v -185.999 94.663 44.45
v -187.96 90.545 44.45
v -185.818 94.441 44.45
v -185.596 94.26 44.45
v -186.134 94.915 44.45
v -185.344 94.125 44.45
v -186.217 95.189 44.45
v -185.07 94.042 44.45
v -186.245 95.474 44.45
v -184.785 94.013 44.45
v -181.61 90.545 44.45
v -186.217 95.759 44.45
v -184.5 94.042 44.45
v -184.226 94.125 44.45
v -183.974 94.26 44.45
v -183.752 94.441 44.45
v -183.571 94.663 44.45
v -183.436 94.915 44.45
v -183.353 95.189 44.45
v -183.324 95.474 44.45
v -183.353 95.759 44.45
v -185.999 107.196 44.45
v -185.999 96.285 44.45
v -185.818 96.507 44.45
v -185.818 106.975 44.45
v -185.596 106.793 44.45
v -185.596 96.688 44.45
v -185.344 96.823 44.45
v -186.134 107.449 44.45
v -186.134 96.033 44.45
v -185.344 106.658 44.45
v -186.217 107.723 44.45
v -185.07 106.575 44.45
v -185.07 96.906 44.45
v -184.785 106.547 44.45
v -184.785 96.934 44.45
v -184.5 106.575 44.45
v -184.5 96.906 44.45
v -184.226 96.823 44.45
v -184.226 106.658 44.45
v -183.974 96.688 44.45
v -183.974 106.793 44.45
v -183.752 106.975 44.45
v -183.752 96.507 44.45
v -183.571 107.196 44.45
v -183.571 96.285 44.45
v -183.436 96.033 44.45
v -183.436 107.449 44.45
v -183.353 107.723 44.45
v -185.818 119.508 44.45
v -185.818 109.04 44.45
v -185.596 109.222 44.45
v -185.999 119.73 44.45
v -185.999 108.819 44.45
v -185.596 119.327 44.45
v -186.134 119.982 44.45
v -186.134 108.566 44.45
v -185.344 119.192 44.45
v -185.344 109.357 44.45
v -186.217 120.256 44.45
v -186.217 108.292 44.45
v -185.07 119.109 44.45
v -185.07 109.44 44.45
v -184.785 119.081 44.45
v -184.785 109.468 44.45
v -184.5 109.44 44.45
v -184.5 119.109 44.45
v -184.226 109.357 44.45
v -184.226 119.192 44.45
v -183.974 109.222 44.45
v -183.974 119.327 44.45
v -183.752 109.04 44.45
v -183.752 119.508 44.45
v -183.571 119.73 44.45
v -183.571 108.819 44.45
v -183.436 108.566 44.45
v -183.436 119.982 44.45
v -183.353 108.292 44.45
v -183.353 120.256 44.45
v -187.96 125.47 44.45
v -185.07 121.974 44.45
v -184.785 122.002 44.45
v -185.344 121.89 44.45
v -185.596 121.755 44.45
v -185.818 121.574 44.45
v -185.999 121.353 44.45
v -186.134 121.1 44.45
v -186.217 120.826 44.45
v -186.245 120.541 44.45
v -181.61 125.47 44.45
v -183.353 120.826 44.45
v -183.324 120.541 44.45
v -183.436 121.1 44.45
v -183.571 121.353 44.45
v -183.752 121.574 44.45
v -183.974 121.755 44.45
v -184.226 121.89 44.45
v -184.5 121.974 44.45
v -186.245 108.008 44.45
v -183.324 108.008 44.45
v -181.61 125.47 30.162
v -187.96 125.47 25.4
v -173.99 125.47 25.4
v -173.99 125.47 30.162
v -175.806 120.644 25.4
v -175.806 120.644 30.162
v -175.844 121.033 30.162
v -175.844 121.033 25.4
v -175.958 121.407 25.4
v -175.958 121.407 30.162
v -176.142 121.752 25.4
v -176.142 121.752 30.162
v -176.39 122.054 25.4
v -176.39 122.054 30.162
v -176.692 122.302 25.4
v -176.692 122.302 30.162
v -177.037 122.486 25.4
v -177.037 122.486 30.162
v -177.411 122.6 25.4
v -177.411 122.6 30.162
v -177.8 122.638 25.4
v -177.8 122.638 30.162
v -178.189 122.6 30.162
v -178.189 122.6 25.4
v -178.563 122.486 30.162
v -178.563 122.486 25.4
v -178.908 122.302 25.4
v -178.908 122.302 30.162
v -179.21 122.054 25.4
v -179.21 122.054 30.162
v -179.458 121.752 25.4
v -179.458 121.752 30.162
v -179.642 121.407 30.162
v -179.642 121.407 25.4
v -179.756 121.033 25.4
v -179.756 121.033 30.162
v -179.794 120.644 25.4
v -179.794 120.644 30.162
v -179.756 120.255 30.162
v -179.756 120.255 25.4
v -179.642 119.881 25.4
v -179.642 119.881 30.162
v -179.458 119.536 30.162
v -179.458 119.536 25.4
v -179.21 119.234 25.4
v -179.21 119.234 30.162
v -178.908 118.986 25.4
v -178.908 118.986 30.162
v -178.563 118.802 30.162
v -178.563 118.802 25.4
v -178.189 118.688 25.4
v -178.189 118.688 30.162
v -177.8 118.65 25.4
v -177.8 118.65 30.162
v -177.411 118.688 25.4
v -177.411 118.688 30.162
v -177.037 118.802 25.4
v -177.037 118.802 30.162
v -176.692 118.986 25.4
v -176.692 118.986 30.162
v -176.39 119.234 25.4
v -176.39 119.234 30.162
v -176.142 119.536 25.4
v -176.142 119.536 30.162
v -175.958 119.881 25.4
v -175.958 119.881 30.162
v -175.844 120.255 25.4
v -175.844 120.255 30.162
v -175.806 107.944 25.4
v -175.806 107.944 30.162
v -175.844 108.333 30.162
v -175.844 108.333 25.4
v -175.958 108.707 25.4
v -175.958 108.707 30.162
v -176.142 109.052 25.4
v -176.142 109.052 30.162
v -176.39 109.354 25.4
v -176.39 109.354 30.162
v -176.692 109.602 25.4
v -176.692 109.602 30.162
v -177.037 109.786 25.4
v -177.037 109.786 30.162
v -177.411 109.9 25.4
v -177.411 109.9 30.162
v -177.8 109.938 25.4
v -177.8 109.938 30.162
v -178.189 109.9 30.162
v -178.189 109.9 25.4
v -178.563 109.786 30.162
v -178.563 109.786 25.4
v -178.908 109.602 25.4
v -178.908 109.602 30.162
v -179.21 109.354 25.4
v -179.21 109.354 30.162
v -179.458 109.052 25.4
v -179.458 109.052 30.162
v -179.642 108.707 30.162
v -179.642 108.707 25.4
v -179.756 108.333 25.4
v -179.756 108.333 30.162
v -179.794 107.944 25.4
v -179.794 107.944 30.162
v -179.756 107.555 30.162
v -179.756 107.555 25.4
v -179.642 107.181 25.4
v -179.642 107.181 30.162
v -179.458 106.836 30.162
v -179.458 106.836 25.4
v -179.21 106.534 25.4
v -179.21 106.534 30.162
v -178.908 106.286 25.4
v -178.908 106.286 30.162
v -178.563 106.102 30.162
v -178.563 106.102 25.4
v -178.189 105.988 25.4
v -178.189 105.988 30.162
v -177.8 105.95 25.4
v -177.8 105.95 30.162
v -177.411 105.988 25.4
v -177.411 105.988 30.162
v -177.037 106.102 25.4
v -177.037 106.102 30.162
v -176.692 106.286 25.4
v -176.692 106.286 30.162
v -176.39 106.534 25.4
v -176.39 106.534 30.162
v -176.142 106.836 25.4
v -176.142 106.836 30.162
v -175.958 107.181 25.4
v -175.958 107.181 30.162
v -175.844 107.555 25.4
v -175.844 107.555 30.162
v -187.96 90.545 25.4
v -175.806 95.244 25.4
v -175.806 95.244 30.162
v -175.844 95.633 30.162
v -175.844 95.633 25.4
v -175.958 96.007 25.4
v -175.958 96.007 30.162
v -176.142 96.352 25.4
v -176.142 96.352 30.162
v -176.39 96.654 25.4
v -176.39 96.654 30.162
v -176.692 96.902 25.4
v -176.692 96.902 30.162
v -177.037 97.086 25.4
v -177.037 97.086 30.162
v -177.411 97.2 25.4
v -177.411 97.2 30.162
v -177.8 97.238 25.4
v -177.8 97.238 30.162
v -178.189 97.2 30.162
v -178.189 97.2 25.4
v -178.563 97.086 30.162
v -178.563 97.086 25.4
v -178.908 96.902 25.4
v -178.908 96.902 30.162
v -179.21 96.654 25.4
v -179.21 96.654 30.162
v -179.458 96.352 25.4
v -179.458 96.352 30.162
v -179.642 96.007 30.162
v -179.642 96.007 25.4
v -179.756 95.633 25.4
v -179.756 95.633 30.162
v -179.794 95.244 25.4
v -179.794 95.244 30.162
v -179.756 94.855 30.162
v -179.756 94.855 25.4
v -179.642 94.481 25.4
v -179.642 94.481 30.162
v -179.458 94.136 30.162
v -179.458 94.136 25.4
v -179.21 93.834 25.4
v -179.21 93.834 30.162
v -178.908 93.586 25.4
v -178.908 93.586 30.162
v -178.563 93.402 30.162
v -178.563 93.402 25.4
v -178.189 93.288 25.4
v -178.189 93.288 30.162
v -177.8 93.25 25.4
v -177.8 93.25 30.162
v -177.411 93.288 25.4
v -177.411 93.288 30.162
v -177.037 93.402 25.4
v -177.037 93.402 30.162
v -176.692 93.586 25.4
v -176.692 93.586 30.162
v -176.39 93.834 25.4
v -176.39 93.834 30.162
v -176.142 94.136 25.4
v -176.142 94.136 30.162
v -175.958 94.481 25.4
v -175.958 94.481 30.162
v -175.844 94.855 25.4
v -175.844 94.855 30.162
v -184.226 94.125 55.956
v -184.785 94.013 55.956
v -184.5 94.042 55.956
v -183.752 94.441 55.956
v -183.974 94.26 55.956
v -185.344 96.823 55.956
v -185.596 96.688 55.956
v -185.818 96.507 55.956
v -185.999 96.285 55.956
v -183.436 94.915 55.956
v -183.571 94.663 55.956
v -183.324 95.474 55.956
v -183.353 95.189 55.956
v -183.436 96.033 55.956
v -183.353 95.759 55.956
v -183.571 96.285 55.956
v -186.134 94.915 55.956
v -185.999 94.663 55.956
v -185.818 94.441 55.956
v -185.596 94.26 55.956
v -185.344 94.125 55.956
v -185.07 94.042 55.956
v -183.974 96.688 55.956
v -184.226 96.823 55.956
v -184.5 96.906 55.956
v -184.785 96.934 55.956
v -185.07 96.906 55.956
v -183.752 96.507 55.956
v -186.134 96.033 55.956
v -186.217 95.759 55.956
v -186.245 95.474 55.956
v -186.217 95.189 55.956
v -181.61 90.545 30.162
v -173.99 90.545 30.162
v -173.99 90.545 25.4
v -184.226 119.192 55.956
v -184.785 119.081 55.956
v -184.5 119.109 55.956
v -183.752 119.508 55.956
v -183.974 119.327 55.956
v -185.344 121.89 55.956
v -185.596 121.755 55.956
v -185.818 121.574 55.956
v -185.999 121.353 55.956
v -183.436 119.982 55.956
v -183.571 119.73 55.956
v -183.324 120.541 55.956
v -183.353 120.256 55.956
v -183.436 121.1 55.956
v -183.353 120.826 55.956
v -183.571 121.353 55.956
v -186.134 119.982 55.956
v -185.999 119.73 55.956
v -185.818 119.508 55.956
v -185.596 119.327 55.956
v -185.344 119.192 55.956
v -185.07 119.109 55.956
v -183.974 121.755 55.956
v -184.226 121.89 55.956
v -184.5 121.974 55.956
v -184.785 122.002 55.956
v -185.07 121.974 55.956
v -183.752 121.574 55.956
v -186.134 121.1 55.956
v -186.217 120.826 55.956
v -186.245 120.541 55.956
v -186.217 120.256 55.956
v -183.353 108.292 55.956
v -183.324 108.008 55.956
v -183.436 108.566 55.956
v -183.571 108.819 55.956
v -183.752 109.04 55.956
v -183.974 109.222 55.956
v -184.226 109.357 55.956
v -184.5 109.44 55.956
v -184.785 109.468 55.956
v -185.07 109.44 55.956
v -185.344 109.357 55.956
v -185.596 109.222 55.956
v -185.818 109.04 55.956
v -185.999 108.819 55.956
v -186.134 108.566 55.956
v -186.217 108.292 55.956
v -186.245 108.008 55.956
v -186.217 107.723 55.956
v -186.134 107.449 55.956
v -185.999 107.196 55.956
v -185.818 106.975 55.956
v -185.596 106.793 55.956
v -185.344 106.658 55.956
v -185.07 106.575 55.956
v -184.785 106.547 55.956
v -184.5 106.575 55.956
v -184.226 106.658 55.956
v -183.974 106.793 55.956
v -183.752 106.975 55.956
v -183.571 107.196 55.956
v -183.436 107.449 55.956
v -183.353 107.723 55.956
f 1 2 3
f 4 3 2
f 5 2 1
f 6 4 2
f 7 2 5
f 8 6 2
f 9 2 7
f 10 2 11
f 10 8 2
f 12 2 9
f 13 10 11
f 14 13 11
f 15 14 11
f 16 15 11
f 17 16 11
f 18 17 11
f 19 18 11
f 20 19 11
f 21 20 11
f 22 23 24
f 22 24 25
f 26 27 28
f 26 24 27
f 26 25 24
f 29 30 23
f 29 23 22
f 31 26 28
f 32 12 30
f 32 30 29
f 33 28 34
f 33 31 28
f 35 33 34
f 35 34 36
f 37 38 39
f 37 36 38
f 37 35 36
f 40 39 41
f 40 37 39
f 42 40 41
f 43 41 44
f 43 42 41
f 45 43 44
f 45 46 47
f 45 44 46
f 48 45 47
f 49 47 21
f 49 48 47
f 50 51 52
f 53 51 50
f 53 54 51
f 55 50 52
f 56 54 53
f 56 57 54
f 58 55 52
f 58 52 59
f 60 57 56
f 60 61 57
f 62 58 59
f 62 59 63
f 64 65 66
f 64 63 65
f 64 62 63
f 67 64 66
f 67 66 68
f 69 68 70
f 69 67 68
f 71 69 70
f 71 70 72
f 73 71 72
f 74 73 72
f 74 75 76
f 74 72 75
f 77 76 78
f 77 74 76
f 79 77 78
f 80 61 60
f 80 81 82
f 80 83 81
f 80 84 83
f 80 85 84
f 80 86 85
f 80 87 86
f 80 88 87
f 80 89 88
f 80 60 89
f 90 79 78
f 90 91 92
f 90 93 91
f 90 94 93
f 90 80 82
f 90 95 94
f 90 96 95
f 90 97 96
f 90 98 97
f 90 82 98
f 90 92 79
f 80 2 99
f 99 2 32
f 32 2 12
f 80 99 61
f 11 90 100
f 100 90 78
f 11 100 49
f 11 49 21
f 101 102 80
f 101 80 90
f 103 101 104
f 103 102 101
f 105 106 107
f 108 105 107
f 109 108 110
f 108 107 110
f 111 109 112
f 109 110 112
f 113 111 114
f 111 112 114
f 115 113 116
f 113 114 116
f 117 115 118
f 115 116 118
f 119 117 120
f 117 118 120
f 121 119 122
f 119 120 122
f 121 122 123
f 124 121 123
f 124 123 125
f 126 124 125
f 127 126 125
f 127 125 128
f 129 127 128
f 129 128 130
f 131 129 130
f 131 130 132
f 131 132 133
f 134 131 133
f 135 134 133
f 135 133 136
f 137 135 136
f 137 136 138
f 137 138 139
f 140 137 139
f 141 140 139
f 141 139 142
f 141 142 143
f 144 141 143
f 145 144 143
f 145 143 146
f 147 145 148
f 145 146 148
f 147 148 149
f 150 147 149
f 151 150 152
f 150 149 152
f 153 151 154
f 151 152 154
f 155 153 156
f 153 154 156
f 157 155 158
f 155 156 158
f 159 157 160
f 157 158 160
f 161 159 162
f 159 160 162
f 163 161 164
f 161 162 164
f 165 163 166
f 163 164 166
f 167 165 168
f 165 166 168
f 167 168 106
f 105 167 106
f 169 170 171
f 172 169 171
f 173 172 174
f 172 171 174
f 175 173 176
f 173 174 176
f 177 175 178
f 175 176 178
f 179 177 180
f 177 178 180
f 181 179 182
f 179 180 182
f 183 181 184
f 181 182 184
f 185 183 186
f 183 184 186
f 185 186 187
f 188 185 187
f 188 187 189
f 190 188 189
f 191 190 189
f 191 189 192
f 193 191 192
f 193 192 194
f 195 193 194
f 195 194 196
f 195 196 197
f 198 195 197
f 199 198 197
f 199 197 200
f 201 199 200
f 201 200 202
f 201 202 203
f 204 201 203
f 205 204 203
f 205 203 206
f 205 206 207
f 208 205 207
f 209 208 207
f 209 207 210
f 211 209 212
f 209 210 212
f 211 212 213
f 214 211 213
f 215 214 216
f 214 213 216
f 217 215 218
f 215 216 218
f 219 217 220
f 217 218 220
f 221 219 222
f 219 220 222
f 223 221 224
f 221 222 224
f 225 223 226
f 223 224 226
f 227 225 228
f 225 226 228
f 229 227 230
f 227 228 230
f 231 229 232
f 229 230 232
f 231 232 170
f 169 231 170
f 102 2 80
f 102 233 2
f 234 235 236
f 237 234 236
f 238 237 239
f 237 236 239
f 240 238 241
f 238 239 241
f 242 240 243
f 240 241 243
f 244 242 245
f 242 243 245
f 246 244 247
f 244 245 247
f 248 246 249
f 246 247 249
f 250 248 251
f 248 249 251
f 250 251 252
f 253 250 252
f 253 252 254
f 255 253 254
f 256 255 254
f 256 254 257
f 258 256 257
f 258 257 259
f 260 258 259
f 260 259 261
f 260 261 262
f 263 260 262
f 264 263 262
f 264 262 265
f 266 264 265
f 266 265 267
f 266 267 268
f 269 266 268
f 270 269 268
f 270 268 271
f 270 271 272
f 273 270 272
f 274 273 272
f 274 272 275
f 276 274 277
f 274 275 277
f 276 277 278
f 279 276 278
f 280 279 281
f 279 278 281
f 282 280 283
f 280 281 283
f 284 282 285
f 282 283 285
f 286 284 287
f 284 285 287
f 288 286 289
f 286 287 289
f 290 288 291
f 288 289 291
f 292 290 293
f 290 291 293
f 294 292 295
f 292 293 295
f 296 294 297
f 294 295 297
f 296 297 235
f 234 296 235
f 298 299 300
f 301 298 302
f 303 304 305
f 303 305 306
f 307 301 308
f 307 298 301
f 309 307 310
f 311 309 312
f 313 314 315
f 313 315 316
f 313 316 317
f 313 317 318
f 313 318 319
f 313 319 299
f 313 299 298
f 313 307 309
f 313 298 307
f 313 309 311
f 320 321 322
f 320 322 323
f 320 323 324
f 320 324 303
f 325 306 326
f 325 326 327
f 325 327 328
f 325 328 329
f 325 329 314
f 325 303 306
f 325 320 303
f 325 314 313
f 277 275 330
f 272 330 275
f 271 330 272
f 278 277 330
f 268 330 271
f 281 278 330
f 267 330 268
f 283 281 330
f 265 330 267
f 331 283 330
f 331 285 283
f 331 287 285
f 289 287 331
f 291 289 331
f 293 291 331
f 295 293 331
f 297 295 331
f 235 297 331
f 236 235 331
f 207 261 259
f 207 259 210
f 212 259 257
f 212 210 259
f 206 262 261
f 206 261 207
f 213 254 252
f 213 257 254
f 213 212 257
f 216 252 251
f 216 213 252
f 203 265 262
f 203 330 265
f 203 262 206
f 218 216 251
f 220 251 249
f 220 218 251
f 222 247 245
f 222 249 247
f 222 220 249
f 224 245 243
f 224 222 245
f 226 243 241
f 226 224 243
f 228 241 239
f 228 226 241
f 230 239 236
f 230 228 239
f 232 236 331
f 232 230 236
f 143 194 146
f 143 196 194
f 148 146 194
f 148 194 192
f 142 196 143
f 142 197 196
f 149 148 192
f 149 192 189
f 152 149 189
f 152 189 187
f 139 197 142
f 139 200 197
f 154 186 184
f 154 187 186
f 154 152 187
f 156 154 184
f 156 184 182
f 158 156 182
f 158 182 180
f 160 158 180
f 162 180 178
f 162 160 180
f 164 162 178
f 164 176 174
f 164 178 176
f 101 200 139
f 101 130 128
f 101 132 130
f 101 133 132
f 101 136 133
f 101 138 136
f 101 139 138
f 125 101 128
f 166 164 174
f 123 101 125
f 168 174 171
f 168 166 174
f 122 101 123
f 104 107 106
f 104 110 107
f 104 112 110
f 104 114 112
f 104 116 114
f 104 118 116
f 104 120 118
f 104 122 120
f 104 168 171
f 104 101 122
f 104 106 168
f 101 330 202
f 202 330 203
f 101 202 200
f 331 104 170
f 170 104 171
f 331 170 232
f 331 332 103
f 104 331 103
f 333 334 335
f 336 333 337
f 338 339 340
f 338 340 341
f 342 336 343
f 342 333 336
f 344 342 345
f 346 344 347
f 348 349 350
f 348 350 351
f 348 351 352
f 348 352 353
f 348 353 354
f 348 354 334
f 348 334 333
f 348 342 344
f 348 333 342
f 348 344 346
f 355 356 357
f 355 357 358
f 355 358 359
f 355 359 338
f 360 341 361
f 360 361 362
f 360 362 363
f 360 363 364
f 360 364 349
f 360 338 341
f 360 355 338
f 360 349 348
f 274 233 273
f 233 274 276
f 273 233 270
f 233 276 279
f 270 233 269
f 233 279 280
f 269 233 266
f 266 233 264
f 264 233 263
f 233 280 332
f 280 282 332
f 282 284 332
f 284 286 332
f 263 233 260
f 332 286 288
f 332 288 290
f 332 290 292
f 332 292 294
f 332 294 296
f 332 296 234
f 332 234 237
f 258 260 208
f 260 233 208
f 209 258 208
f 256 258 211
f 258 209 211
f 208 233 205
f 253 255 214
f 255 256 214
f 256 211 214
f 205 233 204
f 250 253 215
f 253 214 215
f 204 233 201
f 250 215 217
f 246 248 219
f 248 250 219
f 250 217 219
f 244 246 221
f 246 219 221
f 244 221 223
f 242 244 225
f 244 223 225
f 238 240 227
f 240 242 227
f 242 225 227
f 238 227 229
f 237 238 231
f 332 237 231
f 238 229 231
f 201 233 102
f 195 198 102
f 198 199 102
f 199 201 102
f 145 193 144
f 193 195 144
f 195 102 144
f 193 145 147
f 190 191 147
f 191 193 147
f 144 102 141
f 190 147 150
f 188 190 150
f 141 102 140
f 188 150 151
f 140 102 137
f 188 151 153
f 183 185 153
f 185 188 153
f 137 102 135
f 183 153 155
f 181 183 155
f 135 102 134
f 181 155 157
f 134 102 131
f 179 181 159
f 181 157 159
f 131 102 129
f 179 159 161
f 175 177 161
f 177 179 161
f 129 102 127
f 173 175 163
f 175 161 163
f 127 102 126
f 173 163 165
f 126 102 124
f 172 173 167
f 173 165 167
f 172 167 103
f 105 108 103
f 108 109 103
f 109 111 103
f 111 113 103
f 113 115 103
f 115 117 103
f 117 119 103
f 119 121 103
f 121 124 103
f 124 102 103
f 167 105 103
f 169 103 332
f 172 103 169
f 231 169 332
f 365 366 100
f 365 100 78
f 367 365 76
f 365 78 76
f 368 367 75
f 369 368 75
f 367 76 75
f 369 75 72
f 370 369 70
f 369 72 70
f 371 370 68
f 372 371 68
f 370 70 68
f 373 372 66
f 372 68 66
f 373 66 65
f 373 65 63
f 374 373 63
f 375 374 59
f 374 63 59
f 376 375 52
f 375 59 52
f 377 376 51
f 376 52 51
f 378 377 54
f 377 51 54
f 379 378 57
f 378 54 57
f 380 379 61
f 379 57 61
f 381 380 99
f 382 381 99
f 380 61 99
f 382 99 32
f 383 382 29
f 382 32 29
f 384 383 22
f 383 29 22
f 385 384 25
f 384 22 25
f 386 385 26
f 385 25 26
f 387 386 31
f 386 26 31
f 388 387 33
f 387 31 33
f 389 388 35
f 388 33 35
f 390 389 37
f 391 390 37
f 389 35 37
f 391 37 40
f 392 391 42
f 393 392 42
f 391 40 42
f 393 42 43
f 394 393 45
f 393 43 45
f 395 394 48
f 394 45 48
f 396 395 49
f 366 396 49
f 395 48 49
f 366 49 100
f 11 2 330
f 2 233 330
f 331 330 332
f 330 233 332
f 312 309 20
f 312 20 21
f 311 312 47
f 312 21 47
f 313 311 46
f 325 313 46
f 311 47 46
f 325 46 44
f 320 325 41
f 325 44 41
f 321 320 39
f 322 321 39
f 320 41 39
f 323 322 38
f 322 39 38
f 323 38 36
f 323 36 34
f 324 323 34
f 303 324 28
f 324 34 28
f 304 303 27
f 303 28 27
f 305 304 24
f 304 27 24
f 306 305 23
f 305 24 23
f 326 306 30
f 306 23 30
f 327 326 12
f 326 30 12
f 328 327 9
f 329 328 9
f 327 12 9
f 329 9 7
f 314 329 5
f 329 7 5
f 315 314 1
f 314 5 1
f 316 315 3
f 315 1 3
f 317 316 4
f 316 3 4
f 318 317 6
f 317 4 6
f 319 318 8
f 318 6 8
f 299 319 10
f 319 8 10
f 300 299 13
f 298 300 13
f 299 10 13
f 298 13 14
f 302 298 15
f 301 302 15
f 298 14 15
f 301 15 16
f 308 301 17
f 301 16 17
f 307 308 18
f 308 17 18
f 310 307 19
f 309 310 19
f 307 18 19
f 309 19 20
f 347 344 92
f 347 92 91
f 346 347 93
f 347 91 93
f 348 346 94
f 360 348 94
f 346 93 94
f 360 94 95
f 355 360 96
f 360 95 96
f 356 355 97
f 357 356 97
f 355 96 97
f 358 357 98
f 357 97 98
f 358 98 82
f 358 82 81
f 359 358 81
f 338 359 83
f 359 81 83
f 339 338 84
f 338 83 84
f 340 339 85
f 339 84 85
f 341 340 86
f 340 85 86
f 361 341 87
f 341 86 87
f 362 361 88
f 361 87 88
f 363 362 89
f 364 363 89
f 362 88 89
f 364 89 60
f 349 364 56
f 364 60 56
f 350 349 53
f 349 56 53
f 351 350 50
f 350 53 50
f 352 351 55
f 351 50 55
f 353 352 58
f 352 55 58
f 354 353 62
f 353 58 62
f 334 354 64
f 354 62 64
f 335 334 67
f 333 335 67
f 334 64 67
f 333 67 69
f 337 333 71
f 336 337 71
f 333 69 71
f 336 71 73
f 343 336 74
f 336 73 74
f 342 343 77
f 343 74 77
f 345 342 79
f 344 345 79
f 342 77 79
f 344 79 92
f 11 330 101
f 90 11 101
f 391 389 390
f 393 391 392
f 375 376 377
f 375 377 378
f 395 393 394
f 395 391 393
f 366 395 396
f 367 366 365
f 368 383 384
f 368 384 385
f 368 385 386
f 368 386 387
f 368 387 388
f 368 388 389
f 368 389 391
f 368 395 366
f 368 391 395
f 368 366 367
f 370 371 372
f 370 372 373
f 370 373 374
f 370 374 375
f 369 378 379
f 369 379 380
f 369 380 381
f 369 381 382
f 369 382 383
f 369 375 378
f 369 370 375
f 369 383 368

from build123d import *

# Parameters (mm, degrees)
SKETCH1_W           = 13.97
SKETCH1_H           = 34.925
BOSS_EXTRUDE1_DEPTH = 4.7625
SKETCH2_W           = 6.35
SKETCH2_H           = 34.925
BOSS_EXTRUDE2_DEPTH = 14.2875
SKETCH3_R           = 1.4605
BOSS_EXTRUDE3_DEPTH = 11.5062
SKETCH4_R           = 1.9939
CUT_EXTRUDE1_DEPTH  = 11.5062


with BuildPart() as part:
    # Sketch1 → Boss-Extrude1 (new body)
    with BuildSketch(Plane.XY.offset(25.4)):
        with Locations((-180.974999938, 108.007553269)):
            Rectangle(SKETCH1_W, SKETCH1_H)
    extrude(amount=BOSS_EXTRUDE1_DEPTH)

    # Sketch2 → Boss-Extrude2 (add)
    with BuildSketch(Plane.XY.offset(30.1625)):
        with Locations((-184.784999938, 108.007553269)):
            Rectangle(SKETCH2_W, SKETCH2_H)
    extrude(amount=BOSS_EXTRUDE2_DEPTH)

    # Sketch3 → Boss-Extrude3 (add)
    with BuildSketch(Plane.XY.offset(44.45)):
        with Locations((-184.784999938, 120.541132469)):
            Circle(SKETCH3_R)
        with Locations((-184.784999938, 108.007553269)):
            Circle(SKETCH3_R)
        with Locations((-184.784999938, 95.473974069)):
            Circle(SKETCH3_R)
    extrude(amount=BOSS_EXTRUDE3_DEPTH)

    # Sketch4 → Cut-Extrude1 (cut)
    with BuildSketch(Plane.XY.offset(30.1625)):
        with Locations((-177.799999938, 95.244053269)):
            Circle(SKETCH4_R)
        with Locations((-177.799999938, 107.944053269)):
            Circle(SKETCH4_R)
        with Locations((-177.799999938, 120.644053269)):
            Circle(SKETCH4_R)
    extrude(amount=-CUT_EXTRUDE1_DEPTH, mode=Mode.SUBTRACT)


solid = part.part
